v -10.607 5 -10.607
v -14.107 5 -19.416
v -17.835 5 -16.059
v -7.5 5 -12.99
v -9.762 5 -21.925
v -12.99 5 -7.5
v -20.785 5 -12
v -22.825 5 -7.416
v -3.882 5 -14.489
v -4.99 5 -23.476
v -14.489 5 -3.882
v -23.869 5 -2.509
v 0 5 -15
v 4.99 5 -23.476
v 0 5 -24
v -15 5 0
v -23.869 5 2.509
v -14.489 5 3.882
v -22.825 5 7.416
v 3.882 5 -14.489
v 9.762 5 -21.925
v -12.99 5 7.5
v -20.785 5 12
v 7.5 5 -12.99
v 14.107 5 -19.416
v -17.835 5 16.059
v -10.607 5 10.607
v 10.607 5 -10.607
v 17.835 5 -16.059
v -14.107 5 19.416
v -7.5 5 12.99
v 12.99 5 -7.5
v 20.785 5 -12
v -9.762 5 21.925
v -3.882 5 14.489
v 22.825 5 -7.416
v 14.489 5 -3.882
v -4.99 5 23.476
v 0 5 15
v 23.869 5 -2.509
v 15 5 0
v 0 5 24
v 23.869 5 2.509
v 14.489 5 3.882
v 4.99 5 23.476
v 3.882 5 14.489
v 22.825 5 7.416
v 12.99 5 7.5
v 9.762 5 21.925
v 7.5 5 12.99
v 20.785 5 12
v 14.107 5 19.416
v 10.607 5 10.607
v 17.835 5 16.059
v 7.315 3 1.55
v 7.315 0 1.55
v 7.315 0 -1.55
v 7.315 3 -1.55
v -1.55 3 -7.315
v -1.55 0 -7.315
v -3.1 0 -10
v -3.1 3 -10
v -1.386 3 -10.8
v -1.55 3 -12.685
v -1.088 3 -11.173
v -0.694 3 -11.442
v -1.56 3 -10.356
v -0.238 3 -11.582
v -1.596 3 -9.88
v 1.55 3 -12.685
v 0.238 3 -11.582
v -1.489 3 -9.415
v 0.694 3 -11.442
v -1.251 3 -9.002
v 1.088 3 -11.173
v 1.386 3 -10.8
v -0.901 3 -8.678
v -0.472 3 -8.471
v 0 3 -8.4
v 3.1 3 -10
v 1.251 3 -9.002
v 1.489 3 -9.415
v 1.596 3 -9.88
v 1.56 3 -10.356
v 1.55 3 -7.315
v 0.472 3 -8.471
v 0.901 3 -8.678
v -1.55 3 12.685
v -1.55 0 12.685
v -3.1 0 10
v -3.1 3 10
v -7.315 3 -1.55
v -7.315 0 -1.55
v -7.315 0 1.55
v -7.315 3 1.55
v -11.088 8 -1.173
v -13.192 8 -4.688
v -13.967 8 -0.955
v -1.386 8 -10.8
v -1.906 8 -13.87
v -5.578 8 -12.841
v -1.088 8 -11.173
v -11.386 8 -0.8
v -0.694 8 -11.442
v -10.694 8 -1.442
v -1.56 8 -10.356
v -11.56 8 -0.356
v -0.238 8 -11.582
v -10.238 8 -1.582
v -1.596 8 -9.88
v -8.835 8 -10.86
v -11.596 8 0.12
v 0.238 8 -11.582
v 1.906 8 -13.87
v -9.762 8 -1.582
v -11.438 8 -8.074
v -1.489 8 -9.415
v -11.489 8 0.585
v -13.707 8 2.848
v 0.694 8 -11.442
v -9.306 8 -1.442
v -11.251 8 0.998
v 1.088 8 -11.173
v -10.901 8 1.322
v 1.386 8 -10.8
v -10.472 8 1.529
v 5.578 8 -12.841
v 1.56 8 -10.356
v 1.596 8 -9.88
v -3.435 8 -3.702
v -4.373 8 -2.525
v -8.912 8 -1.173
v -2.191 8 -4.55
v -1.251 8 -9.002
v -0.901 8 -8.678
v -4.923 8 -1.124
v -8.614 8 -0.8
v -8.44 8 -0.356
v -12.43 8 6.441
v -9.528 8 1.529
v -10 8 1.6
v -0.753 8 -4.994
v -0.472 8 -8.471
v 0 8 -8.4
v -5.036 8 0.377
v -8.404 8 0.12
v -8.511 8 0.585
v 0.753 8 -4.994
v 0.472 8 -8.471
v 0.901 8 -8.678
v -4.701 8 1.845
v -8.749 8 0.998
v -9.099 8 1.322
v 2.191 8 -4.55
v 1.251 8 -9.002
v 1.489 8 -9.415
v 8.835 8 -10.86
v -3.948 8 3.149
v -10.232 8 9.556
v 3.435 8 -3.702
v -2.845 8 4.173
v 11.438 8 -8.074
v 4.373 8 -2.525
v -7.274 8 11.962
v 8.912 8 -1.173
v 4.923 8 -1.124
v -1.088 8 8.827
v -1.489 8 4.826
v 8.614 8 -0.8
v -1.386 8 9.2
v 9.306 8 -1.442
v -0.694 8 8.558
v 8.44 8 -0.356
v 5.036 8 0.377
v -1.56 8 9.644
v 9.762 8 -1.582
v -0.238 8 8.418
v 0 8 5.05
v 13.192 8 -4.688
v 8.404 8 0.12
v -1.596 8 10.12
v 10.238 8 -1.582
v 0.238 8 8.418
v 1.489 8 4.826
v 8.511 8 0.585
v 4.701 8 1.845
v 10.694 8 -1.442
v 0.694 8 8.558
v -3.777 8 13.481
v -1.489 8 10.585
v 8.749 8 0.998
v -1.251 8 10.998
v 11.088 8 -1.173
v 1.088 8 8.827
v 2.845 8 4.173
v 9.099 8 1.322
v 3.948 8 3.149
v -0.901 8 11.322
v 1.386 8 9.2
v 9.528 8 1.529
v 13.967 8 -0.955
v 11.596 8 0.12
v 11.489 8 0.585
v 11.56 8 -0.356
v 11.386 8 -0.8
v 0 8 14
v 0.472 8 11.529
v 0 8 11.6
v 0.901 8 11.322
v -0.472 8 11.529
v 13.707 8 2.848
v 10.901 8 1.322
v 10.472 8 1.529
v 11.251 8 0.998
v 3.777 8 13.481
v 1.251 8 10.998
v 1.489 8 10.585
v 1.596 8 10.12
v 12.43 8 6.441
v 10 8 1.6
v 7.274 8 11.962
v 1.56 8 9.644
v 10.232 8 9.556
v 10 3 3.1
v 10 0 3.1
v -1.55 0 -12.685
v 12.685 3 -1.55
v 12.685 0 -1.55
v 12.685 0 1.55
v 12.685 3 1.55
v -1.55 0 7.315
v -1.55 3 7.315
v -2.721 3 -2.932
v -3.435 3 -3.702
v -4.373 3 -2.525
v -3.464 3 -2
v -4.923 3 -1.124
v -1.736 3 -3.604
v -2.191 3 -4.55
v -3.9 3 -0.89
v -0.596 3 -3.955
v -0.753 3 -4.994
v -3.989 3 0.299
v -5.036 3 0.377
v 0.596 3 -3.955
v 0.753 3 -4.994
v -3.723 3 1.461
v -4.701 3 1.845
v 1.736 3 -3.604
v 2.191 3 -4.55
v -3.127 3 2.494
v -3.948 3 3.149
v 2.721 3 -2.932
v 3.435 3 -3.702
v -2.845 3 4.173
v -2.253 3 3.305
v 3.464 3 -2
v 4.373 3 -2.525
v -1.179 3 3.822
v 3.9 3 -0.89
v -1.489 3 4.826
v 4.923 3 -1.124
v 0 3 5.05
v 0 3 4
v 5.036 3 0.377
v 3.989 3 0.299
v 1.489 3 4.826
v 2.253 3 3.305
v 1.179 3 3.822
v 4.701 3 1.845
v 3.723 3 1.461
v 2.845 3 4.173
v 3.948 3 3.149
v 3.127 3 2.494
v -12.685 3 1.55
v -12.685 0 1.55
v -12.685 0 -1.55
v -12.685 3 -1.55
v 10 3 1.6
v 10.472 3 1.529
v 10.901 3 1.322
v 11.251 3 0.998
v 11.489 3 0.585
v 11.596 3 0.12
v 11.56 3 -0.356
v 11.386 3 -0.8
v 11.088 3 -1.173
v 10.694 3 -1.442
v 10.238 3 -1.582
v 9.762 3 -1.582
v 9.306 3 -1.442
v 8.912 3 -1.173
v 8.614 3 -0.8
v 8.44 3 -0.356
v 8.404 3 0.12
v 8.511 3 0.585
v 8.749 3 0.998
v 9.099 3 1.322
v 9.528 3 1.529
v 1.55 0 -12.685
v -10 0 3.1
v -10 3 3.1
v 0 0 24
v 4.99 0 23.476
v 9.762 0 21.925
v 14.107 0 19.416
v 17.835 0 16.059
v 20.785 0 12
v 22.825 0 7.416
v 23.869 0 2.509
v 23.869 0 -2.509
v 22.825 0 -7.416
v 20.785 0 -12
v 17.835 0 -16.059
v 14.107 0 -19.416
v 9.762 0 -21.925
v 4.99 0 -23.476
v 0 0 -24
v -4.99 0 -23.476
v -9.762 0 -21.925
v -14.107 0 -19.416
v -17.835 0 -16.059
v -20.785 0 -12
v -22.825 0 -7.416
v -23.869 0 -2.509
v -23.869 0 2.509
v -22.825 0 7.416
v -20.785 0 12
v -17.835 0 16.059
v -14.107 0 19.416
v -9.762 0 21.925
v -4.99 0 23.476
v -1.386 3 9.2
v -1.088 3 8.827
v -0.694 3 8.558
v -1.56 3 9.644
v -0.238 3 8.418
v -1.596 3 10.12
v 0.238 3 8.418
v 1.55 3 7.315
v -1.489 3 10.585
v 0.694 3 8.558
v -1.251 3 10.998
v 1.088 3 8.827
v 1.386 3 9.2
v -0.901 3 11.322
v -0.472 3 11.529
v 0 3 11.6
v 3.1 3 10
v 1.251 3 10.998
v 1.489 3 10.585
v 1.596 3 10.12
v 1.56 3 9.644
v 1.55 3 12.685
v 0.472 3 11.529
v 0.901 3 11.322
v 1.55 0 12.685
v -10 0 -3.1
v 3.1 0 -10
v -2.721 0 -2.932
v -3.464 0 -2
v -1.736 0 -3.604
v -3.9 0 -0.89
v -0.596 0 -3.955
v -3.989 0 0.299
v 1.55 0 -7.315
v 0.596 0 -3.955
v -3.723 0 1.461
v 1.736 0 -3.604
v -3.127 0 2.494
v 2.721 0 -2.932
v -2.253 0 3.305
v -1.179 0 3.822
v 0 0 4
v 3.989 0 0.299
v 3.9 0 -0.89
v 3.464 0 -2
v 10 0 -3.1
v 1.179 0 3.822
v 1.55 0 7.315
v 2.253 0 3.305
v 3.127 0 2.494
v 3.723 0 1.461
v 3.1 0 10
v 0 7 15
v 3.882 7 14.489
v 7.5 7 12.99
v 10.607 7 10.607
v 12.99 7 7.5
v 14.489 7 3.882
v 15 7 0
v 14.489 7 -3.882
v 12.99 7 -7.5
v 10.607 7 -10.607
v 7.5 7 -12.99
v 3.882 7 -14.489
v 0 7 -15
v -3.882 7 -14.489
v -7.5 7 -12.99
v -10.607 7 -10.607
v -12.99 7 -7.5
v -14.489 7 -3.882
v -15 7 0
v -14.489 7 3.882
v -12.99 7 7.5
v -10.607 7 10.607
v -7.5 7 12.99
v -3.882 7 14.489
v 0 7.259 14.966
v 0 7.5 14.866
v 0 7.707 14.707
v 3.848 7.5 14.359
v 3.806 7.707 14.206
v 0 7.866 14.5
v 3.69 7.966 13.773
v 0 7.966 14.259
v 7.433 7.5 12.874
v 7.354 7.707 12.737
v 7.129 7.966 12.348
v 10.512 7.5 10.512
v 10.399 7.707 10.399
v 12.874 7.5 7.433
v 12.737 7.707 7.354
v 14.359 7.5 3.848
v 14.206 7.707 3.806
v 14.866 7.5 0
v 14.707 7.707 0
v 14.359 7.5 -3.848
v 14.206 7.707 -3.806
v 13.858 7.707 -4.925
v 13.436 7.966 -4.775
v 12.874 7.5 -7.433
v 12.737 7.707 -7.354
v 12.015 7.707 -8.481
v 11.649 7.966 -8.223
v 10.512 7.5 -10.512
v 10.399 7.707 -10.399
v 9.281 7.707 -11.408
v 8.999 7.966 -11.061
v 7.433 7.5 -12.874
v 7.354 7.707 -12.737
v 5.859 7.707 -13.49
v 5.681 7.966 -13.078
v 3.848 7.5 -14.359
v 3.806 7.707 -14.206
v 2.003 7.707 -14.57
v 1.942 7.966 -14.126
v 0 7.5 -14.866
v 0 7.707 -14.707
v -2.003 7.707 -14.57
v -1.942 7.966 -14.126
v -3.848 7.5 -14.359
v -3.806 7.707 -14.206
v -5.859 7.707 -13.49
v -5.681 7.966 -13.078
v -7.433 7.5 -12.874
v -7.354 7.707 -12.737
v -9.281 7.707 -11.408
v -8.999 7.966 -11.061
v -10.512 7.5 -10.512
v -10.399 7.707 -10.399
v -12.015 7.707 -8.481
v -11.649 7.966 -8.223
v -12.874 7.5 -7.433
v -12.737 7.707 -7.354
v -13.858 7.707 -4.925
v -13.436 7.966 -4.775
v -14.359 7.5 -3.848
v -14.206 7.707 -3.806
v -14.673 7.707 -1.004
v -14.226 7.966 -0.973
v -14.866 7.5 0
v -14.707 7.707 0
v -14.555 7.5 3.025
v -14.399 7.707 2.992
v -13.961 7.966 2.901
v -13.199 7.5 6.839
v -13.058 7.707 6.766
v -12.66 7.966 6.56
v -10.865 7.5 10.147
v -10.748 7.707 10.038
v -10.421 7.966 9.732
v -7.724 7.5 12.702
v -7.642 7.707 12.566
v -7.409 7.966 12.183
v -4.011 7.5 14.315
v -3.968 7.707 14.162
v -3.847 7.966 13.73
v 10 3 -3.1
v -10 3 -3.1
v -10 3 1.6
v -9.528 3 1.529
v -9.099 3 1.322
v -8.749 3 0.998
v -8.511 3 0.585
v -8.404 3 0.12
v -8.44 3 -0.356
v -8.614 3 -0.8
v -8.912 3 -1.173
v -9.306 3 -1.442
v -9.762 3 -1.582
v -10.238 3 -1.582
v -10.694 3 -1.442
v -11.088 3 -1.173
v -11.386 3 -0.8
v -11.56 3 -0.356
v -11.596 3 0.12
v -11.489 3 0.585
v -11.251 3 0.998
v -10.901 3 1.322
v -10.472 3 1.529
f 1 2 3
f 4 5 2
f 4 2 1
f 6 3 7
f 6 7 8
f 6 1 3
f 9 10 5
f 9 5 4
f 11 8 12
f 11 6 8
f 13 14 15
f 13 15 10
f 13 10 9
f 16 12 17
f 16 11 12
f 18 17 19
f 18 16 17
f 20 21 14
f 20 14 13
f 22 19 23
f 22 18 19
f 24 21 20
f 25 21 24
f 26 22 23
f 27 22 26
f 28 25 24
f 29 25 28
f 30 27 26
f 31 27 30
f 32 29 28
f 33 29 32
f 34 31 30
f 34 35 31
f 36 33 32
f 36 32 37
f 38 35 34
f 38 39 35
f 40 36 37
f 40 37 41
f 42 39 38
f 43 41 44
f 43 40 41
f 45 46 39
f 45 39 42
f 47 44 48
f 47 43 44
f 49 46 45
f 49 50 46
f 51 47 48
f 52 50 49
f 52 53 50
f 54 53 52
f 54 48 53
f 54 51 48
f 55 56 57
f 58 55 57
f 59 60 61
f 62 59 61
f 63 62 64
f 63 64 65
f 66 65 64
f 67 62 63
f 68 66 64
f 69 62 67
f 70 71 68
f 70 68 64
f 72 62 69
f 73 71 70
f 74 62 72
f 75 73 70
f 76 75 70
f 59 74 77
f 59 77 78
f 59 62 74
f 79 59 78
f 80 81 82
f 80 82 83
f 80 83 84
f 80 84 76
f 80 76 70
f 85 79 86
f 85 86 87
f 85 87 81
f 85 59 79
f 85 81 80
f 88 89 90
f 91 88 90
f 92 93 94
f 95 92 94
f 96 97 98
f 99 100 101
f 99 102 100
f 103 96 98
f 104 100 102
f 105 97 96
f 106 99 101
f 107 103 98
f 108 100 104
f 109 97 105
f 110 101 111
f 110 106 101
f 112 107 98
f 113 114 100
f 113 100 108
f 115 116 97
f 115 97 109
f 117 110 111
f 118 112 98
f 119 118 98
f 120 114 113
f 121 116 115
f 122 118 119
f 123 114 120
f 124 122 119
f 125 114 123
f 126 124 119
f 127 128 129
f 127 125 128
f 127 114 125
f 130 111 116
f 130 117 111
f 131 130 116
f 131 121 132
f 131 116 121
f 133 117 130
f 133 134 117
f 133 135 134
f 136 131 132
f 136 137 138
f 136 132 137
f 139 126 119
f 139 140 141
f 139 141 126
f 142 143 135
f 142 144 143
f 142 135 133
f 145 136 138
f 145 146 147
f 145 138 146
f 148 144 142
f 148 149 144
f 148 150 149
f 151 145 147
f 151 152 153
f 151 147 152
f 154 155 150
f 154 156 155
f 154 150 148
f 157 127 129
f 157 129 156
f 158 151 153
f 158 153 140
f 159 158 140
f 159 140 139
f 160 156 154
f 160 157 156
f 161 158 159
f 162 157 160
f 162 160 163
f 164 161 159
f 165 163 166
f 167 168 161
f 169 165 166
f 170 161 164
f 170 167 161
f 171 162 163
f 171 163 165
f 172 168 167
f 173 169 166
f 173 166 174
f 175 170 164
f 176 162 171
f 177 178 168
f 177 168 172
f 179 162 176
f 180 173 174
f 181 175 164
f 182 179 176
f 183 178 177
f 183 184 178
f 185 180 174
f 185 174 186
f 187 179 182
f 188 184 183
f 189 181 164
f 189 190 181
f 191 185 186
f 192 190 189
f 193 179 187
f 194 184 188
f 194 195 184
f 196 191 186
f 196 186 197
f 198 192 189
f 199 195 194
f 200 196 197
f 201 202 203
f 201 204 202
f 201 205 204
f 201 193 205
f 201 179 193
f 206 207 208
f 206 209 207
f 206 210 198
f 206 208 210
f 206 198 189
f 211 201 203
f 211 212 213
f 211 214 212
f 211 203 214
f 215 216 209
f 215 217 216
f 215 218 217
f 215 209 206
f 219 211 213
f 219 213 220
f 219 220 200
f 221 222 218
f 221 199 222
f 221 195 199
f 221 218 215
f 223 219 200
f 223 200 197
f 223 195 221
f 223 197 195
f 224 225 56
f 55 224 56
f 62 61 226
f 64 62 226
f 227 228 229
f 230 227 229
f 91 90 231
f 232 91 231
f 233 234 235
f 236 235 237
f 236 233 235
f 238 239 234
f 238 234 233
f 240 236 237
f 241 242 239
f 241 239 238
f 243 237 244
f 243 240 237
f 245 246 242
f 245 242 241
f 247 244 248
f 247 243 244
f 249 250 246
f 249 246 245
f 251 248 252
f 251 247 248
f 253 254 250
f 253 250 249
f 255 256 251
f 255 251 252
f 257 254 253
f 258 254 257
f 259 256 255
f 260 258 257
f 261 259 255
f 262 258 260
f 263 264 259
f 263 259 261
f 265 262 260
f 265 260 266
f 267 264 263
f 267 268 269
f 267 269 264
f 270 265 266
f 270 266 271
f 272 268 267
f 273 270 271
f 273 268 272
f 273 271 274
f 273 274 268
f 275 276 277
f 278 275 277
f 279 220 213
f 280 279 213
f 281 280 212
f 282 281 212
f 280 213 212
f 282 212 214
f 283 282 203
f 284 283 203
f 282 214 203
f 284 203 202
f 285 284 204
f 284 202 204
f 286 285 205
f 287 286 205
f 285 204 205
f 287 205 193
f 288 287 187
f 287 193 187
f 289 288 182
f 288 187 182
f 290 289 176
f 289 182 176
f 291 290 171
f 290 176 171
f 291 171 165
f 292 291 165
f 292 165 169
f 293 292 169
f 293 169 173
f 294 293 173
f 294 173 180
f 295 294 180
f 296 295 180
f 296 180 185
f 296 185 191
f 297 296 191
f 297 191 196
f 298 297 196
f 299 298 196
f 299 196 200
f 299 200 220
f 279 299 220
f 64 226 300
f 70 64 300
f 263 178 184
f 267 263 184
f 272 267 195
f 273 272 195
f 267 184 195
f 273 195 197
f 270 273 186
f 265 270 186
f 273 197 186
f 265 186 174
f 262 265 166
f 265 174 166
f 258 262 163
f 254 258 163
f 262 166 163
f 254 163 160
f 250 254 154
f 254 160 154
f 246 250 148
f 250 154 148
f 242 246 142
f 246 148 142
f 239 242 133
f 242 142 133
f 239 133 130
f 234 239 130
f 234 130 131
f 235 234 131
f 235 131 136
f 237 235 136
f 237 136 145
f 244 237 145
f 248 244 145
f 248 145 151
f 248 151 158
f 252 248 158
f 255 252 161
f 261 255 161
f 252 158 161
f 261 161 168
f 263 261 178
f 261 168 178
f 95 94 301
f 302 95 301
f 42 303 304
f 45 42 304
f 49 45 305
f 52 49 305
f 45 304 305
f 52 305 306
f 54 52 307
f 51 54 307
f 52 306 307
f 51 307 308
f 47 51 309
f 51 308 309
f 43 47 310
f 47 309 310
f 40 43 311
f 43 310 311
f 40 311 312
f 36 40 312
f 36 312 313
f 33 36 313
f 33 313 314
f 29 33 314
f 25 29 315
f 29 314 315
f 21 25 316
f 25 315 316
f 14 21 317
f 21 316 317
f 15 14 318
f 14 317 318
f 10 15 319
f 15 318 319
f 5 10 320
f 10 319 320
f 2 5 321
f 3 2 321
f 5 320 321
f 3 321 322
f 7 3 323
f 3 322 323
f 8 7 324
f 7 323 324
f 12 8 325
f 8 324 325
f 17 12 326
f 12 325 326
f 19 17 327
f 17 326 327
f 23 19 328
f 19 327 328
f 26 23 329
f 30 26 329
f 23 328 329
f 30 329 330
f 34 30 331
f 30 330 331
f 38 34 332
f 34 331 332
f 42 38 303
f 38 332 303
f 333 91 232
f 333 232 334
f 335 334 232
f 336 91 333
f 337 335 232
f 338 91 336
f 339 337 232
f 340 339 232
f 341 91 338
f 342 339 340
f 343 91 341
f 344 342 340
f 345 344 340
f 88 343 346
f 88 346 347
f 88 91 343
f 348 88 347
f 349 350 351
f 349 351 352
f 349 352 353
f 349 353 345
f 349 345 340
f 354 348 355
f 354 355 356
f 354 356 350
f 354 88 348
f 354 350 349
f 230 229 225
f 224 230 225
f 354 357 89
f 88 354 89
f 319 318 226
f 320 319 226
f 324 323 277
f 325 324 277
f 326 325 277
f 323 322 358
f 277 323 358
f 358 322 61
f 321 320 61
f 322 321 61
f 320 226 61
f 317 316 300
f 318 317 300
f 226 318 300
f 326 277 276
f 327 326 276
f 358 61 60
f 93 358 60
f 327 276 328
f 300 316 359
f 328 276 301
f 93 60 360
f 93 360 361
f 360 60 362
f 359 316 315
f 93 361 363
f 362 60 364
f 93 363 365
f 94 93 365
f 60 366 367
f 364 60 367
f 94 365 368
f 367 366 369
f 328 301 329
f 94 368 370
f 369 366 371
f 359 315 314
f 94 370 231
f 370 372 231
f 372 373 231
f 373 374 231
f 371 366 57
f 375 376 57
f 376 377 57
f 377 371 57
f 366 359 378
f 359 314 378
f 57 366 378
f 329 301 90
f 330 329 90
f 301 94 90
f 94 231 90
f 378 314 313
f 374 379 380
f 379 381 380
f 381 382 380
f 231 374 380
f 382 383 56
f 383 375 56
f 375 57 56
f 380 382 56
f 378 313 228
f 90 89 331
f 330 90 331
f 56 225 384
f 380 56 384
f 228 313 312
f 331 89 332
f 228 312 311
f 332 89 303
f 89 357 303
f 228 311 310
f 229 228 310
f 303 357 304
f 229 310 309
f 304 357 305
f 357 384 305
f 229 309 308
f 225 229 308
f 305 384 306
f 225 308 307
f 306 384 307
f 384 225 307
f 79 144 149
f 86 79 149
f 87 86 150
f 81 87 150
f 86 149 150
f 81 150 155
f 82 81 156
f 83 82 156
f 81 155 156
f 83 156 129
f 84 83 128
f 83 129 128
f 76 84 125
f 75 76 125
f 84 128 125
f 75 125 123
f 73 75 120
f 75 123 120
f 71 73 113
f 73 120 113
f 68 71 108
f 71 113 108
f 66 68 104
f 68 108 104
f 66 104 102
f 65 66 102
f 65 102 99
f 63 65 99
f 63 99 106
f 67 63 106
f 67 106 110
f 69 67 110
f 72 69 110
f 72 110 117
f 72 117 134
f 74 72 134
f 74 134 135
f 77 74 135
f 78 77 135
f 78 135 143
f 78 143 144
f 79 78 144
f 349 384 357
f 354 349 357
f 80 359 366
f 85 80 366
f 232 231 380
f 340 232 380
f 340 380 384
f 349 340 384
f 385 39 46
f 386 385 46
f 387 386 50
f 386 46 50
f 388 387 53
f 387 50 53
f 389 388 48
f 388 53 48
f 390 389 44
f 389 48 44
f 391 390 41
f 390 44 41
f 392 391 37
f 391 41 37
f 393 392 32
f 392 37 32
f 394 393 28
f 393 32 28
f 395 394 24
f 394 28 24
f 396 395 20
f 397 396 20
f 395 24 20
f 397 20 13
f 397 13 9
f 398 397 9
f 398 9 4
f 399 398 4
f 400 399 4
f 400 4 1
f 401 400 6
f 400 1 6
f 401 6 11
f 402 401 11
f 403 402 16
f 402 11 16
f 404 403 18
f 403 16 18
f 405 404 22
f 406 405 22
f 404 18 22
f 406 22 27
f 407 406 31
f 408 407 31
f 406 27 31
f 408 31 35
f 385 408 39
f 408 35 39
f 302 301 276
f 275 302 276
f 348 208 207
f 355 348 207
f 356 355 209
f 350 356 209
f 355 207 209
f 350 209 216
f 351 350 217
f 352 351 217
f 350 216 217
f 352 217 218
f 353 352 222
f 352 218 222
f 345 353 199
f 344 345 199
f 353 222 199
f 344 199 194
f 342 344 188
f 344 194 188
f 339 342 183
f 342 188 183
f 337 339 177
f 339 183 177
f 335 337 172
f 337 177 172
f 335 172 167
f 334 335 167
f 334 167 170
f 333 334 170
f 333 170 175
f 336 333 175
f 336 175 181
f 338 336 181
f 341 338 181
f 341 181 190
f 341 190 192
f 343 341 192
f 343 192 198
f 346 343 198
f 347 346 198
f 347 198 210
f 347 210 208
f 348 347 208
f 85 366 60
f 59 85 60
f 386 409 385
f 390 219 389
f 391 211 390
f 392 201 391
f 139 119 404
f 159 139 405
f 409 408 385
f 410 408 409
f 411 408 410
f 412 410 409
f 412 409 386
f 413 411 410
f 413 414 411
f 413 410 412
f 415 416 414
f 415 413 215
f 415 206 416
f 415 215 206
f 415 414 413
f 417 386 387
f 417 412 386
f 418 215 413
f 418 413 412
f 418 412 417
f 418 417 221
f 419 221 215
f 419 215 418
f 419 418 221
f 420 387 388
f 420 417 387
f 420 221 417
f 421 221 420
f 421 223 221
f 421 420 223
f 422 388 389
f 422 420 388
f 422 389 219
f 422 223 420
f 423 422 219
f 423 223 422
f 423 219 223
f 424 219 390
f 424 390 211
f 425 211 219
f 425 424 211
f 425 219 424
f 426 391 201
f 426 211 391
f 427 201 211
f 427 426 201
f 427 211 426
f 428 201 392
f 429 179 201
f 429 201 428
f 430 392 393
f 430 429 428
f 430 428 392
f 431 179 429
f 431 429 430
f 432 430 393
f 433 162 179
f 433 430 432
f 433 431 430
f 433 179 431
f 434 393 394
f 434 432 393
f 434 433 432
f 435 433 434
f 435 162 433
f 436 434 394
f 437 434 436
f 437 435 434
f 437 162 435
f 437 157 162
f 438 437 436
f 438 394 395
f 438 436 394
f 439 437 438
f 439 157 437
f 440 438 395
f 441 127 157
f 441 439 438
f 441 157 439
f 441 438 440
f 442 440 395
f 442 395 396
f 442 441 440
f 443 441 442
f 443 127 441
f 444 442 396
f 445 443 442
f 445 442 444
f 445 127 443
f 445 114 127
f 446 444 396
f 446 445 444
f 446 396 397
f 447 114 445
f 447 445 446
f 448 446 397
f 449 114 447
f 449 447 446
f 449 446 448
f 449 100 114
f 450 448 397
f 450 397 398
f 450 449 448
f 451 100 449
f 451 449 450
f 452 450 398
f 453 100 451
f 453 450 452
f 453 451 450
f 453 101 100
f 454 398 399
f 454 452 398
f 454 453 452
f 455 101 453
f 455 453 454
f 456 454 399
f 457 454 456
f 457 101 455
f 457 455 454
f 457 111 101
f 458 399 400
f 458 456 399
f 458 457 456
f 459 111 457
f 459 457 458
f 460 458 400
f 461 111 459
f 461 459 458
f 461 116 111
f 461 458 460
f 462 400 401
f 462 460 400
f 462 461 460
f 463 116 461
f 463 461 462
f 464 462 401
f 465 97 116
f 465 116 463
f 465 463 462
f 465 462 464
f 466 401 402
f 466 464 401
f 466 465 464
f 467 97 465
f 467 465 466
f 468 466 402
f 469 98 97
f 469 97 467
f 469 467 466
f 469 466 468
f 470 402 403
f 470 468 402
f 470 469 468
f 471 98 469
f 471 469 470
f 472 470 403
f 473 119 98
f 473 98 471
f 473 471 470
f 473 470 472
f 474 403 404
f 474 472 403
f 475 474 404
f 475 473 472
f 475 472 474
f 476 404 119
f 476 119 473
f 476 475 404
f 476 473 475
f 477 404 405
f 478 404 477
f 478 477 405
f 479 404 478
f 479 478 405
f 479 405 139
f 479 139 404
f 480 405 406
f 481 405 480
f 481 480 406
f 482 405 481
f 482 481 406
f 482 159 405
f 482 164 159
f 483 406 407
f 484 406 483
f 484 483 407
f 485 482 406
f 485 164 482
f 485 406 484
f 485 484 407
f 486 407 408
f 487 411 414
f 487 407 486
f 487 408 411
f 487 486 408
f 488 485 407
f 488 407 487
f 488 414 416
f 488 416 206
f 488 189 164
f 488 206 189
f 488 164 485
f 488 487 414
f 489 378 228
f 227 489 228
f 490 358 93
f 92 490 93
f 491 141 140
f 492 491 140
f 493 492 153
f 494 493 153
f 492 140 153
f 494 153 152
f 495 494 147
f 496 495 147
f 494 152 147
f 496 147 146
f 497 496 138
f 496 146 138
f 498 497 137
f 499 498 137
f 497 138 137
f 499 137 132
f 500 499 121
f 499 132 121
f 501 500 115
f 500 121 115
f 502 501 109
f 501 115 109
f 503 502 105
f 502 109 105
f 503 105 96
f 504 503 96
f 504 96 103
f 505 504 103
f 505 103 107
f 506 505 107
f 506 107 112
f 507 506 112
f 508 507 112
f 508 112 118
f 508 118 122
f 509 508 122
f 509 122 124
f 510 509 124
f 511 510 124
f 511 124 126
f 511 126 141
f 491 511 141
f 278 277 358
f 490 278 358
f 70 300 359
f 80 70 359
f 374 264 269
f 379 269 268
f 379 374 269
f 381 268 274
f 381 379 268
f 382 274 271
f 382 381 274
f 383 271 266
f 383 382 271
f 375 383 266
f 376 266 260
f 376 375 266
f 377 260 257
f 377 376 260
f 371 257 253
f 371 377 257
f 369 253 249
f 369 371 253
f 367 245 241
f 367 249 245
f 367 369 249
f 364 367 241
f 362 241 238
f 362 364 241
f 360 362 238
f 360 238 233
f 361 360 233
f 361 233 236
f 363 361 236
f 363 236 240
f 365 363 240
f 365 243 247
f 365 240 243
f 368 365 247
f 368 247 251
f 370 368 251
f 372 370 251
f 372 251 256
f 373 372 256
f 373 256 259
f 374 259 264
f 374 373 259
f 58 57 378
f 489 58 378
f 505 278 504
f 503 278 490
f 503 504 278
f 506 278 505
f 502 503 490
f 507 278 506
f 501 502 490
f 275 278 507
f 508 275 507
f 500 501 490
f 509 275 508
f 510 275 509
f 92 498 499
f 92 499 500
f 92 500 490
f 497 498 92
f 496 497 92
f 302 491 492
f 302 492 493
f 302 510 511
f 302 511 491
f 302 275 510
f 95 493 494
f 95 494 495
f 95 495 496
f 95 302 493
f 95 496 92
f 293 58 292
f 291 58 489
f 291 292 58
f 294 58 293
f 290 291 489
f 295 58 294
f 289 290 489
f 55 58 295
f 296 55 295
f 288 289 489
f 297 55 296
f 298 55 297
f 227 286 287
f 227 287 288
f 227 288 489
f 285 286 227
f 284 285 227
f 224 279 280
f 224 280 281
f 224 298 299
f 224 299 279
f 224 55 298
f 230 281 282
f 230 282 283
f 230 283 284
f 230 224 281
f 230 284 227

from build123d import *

# Parameters (mm, degrees)
SKETCH1_R           = 24
SKETCH1_R_2         = 4
BOSS_EXTRUDE1_DEPTH = 5
SKETCH2_R           = 15
BOSS_EXTRUDE2_DEPTH = 3
SKETCH4_R           = 5.05
CUT_EXTRUDE2_DEPTH  = 5
FILLET1_R           = 1
SKETCH5_R           = 1.6
CUT_EXTRUDE3_DEPTH  = 35.871191548
CUT_EXTRUDE15_DEPTH = 3


with BuildPart() as part:
    # Sketch1 → Boss-Extrude1 (new body)
    with BuildSketch(Plane(origin=(0, 0, 0), x_dir=(1, 0, 0), z_dir=(0, 1, 0))):
        with Locations(Location((0, 0, 0), (0, 0, 270))):
            Circle(SKETCH1_R)
        with Locations(Location((0, 0, 0), (0, 0, 270))):
            Circle(SKETCH1_R_2, mode=Mode.SUBTRACT)
    extrude(amount=BOSS_EXTRUDE1_DEPTH)

    # Sketch2 → Boss-Extrude2 (add)
    with BuildSketch(Plane(origin=(0, 5, 0), x_dir=(1, 0, 0), z_dir=(0, 1, 0))):
        with Locations(Location((0, 0, 0), (0, 0, 270))):
            Circle(SKETCH2_R)
    extrude(amount=BOSS_EXTRUDE2_DEPTH)

    # Sketch4 → Cut-Extrude2 (cut)
    with BuildSketch(Plane(origin=(0, 8, 0), x_dir=(1, 0, 0), z_dir=(0, 1, 0))):
        with Locations(Location((0, 0, 0), (0, 0, 270))):
            Circle(SKETCH4_R)
    extrude(amount=-CUT_EXTRUDE2_DEPTH, mode=Mode.SUBTRACT)

    # Fillet1
    fillet1_edges = [part.edges().sort_by_distance(p)[0] for p in [
        (0, 8, -15),
    ]]
    fillet(fillet1_edges, radius=FILLET1_R)

    # Sketch5 → Cut-Extrude3 (cut, through all)
    with BuildSketch(Plane(origin=(0, 8, 0), x_dir=(1, 0, 0), z_dir=(0, 1, 0))):
        with Locations(Location((0, 10, 0), (0, 0, 270))):
            Circle(SKETCH5_R)
        with Locations(Location((-10, 0, 0), (0, 0, 270))):
            Circle(SKETCH5_R)
        with Locations(Location((0, -10, 0), (0, 0, 270))):
            Circle(SKETCH5_R)
        with Locations(Location((10, 0, 0), (0, 0, 270))):
            Circle(SKETCH5_R)
    extrude(amount=-CUT_EXTRUDE3_DEPTH, mode=Mode.SUBTRACT)

    # Sketch10 → Cut-Extrude15 (cut)
    with BuildSketch(Plane.XZ):
        Polygon((10, -3.1), (12.684678752, -1.55), (12.684678752, 1.55), (10, 3.1), (7.315321248, 1.55), (7.315321248, -1.55), align=None)
        Polygon((3.1, 10), (1.55, 12.684678752), (-1.55, 12.684678752), (-3.1, 10), (-1.55, 7.315321248), (1.55, 7.315321248), align=None)
        Polygon((-3.1, -10), (-1.55, -12.684678752), (1.55, -12.684678752), (3.1, -10), (1.55, -7.315321248), (-1.55, -7.315321248), align=None)
        Polygon((-10, 3.1), (-12.684678752, 1.55), (-12.684678752, -1.55), (-10, -3.1), (-7.315321248, -1.55), (-7.315321248, 1.55), align=None)
    extrude(amount=-CUT_EXTRUDE15_DEPTH, mode=Mode.SUBTRACT)


solid = part.part
